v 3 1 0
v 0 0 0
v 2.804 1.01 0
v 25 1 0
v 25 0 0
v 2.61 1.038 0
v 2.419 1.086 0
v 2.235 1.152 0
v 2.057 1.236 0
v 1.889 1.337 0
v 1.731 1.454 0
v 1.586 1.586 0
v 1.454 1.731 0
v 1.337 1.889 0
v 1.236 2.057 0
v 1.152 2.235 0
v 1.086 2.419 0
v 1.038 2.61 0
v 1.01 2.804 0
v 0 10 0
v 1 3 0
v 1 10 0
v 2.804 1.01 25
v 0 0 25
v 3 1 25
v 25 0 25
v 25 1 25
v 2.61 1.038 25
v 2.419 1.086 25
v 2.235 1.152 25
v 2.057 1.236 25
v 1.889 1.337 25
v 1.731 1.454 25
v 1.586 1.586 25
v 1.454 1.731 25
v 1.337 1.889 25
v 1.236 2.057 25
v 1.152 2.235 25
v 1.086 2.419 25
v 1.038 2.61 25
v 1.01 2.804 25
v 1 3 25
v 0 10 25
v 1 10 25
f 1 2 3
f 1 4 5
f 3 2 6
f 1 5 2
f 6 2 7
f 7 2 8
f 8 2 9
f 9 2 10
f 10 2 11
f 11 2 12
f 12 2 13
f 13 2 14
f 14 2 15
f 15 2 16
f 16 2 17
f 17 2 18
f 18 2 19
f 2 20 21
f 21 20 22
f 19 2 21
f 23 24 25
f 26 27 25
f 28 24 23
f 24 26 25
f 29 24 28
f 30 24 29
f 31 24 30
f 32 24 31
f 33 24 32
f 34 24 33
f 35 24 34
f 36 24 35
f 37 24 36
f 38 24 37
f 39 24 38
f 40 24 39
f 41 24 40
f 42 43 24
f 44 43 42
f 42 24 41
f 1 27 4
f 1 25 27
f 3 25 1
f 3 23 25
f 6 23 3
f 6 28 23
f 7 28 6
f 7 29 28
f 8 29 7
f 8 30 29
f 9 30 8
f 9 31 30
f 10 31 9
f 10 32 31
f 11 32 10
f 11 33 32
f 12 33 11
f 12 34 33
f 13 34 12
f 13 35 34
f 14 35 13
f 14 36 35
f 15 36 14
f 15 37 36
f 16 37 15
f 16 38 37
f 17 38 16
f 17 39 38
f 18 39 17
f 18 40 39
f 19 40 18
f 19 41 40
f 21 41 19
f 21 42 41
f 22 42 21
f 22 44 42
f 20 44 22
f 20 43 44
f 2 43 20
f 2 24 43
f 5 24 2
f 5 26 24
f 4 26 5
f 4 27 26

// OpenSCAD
width = 25;
height = 10;
length = 25;

r = 2;
thick = 1;

$fn = 64;

linear_extrude(height=width)
difference()
{
square([length,height]);
translate([thick,thick])
offset(r)
  offset(-r)
   square(100);
}
